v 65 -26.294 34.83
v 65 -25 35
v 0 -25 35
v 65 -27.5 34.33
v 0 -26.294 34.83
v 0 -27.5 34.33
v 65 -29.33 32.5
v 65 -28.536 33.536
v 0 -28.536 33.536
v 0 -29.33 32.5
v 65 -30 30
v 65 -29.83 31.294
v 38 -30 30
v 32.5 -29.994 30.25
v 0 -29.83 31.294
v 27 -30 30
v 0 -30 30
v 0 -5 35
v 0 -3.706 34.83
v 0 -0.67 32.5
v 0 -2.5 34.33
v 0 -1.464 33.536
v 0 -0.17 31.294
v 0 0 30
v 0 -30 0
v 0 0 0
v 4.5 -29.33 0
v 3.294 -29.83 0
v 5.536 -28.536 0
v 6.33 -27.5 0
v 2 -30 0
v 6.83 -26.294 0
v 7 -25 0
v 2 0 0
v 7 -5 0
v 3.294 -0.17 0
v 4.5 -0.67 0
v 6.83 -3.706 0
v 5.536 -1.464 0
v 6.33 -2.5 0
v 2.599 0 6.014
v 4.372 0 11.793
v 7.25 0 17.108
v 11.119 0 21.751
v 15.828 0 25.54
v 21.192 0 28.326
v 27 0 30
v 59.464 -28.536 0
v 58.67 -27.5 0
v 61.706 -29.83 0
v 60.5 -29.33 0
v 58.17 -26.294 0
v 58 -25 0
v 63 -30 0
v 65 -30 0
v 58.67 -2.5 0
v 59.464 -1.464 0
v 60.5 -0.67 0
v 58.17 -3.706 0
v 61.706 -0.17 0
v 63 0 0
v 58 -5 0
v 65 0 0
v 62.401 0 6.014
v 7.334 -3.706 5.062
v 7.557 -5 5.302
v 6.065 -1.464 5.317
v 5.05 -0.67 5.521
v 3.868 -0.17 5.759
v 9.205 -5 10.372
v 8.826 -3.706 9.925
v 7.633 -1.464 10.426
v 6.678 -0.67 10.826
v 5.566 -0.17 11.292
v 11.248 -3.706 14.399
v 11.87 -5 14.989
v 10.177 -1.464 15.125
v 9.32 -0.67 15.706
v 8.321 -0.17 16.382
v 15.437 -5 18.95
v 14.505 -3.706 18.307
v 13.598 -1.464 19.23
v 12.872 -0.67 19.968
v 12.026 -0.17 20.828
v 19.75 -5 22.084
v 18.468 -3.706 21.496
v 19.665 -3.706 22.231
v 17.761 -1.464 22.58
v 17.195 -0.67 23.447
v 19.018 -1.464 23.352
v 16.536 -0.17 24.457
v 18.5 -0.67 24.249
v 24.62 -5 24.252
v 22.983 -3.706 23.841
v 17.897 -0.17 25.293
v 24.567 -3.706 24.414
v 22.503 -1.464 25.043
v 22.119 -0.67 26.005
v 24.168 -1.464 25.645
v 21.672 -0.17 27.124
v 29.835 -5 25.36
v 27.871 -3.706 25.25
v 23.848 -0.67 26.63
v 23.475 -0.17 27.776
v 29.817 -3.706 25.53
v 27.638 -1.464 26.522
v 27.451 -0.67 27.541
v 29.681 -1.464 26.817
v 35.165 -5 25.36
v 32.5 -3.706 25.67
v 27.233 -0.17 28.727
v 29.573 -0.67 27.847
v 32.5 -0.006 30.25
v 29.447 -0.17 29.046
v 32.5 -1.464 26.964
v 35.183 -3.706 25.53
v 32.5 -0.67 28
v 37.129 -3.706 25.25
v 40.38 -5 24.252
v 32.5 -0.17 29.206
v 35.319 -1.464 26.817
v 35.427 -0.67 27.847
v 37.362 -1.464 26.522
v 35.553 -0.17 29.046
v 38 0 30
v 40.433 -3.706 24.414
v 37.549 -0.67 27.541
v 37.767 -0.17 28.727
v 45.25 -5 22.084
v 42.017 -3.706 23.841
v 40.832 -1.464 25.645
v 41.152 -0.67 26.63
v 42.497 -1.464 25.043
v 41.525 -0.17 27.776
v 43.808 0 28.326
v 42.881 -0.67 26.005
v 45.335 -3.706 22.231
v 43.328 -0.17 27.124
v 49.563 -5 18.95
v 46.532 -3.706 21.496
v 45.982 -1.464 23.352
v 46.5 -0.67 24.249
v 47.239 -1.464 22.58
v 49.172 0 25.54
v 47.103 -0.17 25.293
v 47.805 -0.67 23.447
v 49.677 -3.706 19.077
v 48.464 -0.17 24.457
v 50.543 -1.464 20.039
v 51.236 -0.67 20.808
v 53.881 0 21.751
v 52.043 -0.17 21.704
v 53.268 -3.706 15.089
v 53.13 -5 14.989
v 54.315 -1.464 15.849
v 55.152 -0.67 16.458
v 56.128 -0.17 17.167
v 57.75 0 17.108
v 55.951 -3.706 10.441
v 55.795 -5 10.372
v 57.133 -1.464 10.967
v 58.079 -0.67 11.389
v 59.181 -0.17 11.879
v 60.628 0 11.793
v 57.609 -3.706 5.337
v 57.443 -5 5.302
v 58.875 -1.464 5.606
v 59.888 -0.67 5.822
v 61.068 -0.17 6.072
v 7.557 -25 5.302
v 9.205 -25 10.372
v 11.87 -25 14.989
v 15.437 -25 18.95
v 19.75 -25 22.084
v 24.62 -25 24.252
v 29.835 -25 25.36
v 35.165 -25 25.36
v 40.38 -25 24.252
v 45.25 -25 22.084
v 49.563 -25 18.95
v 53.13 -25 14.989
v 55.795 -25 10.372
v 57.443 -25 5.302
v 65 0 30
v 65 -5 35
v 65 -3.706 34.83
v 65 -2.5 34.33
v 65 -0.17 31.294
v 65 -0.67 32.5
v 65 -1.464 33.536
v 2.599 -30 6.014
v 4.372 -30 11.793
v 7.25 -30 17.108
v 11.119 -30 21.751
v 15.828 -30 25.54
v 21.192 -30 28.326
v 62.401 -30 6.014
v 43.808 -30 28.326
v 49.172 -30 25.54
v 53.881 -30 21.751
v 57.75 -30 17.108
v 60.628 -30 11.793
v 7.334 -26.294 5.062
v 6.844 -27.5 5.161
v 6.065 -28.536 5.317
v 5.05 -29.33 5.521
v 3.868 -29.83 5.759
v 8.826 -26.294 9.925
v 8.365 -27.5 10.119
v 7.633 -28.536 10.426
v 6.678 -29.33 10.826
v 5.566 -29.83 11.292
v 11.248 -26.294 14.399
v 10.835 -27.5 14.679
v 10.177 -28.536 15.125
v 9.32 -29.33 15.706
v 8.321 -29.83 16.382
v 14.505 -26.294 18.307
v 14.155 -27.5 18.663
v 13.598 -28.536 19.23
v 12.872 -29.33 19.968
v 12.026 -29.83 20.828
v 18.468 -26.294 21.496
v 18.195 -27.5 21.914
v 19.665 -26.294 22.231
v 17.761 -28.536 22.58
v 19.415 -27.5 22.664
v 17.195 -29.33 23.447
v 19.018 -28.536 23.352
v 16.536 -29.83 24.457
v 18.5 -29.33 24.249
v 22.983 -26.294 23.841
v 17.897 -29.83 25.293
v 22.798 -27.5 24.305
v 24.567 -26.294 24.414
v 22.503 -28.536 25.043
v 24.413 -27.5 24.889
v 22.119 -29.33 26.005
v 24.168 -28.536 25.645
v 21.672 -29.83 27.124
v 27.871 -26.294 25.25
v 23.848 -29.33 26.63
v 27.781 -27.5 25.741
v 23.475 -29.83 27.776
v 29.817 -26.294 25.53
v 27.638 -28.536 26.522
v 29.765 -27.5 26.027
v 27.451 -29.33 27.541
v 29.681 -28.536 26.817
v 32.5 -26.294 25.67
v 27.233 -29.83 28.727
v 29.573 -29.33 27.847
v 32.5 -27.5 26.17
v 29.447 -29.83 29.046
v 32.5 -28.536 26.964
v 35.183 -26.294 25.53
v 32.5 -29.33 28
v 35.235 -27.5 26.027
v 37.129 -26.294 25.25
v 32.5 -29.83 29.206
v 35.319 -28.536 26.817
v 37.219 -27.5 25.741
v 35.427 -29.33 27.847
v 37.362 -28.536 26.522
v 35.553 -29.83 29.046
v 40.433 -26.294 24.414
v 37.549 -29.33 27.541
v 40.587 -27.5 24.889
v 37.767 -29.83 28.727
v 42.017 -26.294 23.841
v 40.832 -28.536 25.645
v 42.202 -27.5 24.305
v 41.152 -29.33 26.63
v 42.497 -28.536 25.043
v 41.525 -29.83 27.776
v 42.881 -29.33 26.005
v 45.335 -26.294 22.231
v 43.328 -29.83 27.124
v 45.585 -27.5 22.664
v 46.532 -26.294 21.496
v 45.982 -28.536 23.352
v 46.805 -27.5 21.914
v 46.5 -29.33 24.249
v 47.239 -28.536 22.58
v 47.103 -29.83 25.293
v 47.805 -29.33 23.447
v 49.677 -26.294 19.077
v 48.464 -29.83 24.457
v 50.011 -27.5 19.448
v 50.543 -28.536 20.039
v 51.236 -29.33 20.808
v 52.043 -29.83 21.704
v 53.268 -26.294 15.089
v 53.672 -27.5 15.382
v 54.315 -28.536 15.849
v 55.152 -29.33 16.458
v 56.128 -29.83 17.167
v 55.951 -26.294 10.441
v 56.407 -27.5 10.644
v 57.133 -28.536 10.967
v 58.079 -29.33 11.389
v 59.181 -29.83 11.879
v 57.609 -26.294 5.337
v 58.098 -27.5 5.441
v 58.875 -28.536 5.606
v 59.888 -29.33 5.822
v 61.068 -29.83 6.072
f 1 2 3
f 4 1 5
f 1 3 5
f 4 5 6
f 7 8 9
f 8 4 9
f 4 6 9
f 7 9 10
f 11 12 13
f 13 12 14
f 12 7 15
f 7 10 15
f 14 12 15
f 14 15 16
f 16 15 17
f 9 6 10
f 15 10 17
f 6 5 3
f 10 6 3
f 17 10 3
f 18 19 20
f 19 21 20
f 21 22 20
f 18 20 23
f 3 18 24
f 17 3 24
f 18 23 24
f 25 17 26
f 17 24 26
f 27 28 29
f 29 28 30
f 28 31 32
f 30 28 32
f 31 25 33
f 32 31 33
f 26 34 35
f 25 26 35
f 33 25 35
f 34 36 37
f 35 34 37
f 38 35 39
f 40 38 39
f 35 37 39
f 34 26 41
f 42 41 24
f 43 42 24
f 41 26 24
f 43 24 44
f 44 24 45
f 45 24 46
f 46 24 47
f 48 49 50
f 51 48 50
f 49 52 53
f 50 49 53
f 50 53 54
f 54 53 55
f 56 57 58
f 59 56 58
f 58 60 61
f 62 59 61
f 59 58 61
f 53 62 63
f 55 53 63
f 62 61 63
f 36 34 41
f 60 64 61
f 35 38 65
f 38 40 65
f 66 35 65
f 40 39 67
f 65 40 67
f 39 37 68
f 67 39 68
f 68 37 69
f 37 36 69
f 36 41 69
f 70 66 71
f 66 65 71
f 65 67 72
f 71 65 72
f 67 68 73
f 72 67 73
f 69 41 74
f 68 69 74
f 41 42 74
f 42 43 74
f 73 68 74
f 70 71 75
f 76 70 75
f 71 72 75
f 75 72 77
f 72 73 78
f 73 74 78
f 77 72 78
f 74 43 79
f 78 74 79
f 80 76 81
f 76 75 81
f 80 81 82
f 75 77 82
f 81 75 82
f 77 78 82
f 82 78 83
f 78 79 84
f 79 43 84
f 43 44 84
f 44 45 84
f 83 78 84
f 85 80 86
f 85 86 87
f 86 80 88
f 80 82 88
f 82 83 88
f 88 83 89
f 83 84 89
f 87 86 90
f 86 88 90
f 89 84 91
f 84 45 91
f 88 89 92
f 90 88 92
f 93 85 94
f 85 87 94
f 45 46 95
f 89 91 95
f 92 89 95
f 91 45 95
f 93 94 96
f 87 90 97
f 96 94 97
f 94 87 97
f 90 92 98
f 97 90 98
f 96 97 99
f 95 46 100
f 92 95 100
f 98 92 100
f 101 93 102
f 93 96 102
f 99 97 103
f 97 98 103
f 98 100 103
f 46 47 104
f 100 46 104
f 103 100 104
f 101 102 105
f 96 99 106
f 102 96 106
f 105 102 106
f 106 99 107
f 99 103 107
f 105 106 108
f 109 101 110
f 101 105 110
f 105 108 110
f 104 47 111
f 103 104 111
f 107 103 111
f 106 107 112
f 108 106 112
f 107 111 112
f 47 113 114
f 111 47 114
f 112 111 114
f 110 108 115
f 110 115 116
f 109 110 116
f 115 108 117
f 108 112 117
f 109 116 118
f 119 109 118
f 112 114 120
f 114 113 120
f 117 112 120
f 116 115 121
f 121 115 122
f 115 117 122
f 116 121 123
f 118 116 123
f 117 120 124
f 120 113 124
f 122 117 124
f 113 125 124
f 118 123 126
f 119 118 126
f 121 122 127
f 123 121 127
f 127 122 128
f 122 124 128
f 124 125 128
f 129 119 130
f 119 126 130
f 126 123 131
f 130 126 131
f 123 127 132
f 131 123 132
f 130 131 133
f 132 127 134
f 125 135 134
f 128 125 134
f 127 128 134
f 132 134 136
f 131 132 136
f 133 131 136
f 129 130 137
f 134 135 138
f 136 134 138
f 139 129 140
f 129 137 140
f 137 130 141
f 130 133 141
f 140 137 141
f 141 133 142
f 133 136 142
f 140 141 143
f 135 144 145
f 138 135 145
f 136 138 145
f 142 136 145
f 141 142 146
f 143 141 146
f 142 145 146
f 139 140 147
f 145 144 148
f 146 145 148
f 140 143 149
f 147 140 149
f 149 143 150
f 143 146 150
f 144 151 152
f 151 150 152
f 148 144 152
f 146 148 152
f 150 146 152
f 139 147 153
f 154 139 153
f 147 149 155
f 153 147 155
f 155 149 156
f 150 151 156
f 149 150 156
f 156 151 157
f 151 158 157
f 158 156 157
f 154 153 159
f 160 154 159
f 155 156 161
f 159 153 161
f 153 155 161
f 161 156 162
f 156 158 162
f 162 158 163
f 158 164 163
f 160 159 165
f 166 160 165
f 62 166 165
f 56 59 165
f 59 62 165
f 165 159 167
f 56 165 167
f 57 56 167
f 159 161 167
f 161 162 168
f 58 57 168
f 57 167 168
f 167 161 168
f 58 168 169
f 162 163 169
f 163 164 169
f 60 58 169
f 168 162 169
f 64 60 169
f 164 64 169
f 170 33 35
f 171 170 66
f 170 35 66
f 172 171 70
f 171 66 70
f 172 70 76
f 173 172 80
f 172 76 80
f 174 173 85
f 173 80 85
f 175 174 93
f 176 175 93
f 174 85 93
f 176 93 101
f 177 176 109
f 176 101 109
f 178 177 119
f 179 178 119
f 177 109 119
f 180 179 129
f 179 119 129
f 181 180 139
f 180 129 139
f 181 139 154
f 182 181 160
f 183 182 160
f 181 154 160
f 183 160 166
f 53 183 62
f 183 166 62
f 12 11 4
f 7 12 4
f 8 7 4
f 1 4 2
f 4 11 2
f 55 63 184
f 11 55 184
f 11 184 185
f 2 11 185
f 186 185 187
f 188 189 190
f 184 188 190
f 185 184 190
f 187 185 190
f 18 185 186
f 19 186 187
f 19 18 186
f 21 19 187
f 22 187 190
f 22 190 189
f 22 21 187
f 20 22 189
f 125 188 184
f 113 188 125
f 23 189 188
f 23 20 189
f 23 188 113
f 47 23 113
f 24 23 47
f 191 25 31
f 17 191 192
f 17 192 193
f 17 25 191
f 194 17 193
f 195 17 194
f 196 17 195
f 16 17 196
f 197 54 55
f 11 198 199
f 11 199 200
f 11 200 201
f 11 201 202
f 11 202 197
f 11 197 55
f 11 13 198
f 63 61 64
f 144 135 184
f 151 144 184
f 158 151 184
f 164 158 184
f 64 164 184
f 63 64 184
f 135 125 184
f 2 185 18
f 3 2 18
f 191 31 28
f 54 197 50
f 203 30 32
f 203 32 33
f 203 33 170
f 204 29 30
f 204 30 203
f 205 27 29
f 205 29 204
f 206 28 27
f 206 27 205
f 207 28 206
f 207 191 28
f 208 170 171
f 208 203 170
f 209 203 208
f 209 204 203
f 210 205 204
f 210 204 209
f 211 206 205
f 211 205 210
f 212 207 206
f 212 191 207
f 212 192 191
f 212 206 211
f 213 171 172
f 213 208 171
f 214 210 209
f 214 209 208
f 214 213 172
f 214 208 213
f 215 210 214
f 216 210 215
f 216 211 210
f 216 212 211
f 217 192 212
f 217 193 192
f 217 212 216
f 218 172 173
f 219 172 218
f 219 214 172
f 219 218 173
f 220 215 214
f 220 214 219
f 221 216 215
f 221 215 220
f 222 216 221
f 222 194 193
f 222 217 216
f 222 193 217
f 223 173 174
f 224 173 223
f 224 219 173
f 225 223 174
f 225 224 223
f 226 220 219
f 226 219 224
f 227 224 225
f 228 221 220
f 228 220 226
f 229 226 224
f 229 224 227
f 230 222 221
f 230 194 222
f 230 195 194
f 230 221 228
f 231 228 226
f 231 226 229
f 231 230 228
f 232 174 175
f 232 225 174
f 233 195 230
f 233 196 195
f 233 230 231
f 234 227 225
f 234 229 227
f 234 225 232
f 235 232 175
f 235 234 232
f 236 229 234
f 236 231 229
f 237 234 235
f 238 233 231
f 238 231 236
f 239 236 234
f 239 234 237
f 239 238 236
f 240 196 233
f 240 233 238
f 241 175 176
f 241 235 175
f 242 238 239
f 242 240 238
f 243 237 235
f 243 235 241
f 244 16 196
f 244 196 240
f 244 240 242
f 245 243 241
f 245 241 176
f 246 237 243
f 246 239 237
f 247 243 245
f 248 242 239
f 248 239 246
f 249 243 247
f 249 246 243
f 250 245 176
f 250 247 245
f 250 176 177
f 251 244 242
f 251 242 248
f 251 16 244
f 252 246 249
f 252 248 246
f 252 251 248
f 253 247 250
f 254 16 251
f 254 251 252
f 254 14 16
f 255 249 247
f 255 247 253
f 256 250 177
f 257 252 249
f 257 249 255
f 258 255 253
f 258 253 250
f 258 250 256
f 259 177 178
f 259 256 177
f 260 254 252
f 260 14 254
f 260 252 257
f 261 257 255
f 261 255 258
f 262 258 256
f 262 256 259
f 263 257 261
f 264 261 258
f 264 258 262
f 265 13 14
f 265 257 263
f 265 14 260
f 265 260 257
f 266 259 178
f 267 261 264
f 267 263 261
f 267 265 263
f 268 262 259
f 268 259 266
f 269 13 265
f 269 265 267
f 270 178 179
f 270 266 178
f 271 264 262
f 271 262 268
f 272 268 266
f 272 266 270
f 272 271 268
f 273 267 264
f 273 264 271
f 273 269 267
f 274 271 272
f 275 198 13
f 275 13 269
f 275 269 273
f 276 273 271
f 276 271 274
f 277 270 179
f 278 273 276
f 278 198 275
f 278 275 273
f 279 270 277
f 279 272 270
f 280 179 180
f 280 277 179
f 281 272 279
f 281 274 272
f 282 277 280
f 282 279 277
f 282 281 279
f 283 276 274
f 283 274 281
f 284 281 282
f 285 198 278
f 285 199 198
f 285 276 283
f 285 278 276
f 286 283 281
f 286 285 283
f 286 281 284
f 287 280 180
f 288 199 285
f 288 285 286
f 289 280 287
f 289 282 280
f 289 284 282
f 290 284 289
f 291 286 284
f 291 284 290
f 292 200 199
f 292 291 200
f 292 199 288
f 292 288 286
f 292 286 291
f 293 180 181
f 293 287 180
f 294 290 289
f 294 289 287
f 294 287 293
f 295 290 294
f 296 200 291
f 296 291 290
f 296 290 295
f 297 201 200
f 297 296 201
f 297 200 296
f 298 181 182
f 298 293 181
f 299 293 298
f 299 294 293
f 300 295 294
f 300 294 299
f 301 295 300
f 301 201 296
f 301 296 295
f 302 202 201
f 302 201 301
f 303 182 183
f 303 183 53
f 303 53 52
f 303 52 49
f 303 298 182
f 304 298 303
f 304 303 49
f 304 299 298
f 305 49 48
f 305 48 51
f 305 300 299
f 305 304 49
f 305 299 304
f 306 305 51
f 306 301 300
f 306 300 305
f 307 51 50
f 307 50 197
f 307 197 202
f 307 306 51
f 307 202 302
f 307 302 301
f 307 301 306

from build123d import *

# Parameters (mm, degrees)
F1_DEPTH    = 30
F2_T1_DEPTH = 90
F2_T4_ANGLE = 236.2626685885
F2_T6_ANGLE = 236.2626685885


# Not quite as in the source:
# - a fillet or chamfer that OpenCascade refuses, or shapes differently, is made with other operations: its cross-section is extruded or revolved along the edge and cut away or added


with BuildPart() as f1:
    # F0 (on Front) → F1 (new body)
    with BuildSketch(Plane.XZ):
        with BuildLine():
            Line((0, 35), (0, 0))
            Line((0, 0), (7, 0))
            ThreePointArc((7, 0), (32.5, 25.5), (58, 0))
            Line((58, 0), (65, 0))
            Line((65, 0), (65, 35))
            Line((65, 35), (0, 35))
        make_face()
    extrude(amount=F1_DEPTH)

    # F2: fillet of radius 5 on 4 edges, made by hand

    # F2_s2 → F2_t1 (cut)
    with BuildSketch(Plane.YZ.offset(-12.5)):
        with BuildLine():
            ThreePointArc((-25, 35), (-28.5355339059, 33.5355339059), (-30, 30))
            Line((-30, 30), (-30, 35))
            Line((-30, 35), (-25, 35))
        make_face()
        with BuildLine():
            ThreePointArc((-5, 35), (-1.4644660941, 33.5355339059), (0, 30))
            Line((0, 30), (0, 35))
            Line((0, 35), (-5, 35))
        make_face()
    extrude(amount=F2_T1_DEPTH, mode=Mode.SUBTRACT)

    # F2_s3 → F2_t4 (revolve, cut)
    with BuildSketch(Plane(origin=(7.2249714164, 0, -13.5133770415), x_dir=(0, 1, 0), z_dir=(0.4714942341, 0, -0.881869144))):
        with BuildLine():
            ThreePointArc((-25, 3.1607471809), (-28.5355339059, 1.6962810868), (-30, -1.8392528191))
            Line((-30, -1.8392528191), (-30, 3.1607471809))
            Line((-30, 3.1607471809), (-25, 3.1607471809))
        make_face()
    revolve(axis=Axis((32.5, -30, 0), (0, 1, 0)), revolution_arc=F2_T4_ANGLE, mode=Mode.SUBTRACT)

    # F2_s5 → F2_t6 (revolve, cut)
    with BuildSketch(Plane(origin=(7.2249714164, 0, -13.5133770415), x_dir=(0, 1, 0), z_dir=(0.4714942341, 0, -0.881869144))):
        with BuildLine():
            ThreePointArc((-5, 3.1607471809), (-1.4644660941, 1.6962810868), (0, -1.8392528191))
            Line((0, -1.8392528191), (0, 3.1607471809))
            Line((0, 3.1607471809), (-5, 3.1607471809))
        make_face()
    revolve(axis=Axis((32.5, 0, 0), (0, 1, 0)), revolution_arc=F2_T6_ANGLE, mode=Mode.SUBTRACT)


solid = f1.part
